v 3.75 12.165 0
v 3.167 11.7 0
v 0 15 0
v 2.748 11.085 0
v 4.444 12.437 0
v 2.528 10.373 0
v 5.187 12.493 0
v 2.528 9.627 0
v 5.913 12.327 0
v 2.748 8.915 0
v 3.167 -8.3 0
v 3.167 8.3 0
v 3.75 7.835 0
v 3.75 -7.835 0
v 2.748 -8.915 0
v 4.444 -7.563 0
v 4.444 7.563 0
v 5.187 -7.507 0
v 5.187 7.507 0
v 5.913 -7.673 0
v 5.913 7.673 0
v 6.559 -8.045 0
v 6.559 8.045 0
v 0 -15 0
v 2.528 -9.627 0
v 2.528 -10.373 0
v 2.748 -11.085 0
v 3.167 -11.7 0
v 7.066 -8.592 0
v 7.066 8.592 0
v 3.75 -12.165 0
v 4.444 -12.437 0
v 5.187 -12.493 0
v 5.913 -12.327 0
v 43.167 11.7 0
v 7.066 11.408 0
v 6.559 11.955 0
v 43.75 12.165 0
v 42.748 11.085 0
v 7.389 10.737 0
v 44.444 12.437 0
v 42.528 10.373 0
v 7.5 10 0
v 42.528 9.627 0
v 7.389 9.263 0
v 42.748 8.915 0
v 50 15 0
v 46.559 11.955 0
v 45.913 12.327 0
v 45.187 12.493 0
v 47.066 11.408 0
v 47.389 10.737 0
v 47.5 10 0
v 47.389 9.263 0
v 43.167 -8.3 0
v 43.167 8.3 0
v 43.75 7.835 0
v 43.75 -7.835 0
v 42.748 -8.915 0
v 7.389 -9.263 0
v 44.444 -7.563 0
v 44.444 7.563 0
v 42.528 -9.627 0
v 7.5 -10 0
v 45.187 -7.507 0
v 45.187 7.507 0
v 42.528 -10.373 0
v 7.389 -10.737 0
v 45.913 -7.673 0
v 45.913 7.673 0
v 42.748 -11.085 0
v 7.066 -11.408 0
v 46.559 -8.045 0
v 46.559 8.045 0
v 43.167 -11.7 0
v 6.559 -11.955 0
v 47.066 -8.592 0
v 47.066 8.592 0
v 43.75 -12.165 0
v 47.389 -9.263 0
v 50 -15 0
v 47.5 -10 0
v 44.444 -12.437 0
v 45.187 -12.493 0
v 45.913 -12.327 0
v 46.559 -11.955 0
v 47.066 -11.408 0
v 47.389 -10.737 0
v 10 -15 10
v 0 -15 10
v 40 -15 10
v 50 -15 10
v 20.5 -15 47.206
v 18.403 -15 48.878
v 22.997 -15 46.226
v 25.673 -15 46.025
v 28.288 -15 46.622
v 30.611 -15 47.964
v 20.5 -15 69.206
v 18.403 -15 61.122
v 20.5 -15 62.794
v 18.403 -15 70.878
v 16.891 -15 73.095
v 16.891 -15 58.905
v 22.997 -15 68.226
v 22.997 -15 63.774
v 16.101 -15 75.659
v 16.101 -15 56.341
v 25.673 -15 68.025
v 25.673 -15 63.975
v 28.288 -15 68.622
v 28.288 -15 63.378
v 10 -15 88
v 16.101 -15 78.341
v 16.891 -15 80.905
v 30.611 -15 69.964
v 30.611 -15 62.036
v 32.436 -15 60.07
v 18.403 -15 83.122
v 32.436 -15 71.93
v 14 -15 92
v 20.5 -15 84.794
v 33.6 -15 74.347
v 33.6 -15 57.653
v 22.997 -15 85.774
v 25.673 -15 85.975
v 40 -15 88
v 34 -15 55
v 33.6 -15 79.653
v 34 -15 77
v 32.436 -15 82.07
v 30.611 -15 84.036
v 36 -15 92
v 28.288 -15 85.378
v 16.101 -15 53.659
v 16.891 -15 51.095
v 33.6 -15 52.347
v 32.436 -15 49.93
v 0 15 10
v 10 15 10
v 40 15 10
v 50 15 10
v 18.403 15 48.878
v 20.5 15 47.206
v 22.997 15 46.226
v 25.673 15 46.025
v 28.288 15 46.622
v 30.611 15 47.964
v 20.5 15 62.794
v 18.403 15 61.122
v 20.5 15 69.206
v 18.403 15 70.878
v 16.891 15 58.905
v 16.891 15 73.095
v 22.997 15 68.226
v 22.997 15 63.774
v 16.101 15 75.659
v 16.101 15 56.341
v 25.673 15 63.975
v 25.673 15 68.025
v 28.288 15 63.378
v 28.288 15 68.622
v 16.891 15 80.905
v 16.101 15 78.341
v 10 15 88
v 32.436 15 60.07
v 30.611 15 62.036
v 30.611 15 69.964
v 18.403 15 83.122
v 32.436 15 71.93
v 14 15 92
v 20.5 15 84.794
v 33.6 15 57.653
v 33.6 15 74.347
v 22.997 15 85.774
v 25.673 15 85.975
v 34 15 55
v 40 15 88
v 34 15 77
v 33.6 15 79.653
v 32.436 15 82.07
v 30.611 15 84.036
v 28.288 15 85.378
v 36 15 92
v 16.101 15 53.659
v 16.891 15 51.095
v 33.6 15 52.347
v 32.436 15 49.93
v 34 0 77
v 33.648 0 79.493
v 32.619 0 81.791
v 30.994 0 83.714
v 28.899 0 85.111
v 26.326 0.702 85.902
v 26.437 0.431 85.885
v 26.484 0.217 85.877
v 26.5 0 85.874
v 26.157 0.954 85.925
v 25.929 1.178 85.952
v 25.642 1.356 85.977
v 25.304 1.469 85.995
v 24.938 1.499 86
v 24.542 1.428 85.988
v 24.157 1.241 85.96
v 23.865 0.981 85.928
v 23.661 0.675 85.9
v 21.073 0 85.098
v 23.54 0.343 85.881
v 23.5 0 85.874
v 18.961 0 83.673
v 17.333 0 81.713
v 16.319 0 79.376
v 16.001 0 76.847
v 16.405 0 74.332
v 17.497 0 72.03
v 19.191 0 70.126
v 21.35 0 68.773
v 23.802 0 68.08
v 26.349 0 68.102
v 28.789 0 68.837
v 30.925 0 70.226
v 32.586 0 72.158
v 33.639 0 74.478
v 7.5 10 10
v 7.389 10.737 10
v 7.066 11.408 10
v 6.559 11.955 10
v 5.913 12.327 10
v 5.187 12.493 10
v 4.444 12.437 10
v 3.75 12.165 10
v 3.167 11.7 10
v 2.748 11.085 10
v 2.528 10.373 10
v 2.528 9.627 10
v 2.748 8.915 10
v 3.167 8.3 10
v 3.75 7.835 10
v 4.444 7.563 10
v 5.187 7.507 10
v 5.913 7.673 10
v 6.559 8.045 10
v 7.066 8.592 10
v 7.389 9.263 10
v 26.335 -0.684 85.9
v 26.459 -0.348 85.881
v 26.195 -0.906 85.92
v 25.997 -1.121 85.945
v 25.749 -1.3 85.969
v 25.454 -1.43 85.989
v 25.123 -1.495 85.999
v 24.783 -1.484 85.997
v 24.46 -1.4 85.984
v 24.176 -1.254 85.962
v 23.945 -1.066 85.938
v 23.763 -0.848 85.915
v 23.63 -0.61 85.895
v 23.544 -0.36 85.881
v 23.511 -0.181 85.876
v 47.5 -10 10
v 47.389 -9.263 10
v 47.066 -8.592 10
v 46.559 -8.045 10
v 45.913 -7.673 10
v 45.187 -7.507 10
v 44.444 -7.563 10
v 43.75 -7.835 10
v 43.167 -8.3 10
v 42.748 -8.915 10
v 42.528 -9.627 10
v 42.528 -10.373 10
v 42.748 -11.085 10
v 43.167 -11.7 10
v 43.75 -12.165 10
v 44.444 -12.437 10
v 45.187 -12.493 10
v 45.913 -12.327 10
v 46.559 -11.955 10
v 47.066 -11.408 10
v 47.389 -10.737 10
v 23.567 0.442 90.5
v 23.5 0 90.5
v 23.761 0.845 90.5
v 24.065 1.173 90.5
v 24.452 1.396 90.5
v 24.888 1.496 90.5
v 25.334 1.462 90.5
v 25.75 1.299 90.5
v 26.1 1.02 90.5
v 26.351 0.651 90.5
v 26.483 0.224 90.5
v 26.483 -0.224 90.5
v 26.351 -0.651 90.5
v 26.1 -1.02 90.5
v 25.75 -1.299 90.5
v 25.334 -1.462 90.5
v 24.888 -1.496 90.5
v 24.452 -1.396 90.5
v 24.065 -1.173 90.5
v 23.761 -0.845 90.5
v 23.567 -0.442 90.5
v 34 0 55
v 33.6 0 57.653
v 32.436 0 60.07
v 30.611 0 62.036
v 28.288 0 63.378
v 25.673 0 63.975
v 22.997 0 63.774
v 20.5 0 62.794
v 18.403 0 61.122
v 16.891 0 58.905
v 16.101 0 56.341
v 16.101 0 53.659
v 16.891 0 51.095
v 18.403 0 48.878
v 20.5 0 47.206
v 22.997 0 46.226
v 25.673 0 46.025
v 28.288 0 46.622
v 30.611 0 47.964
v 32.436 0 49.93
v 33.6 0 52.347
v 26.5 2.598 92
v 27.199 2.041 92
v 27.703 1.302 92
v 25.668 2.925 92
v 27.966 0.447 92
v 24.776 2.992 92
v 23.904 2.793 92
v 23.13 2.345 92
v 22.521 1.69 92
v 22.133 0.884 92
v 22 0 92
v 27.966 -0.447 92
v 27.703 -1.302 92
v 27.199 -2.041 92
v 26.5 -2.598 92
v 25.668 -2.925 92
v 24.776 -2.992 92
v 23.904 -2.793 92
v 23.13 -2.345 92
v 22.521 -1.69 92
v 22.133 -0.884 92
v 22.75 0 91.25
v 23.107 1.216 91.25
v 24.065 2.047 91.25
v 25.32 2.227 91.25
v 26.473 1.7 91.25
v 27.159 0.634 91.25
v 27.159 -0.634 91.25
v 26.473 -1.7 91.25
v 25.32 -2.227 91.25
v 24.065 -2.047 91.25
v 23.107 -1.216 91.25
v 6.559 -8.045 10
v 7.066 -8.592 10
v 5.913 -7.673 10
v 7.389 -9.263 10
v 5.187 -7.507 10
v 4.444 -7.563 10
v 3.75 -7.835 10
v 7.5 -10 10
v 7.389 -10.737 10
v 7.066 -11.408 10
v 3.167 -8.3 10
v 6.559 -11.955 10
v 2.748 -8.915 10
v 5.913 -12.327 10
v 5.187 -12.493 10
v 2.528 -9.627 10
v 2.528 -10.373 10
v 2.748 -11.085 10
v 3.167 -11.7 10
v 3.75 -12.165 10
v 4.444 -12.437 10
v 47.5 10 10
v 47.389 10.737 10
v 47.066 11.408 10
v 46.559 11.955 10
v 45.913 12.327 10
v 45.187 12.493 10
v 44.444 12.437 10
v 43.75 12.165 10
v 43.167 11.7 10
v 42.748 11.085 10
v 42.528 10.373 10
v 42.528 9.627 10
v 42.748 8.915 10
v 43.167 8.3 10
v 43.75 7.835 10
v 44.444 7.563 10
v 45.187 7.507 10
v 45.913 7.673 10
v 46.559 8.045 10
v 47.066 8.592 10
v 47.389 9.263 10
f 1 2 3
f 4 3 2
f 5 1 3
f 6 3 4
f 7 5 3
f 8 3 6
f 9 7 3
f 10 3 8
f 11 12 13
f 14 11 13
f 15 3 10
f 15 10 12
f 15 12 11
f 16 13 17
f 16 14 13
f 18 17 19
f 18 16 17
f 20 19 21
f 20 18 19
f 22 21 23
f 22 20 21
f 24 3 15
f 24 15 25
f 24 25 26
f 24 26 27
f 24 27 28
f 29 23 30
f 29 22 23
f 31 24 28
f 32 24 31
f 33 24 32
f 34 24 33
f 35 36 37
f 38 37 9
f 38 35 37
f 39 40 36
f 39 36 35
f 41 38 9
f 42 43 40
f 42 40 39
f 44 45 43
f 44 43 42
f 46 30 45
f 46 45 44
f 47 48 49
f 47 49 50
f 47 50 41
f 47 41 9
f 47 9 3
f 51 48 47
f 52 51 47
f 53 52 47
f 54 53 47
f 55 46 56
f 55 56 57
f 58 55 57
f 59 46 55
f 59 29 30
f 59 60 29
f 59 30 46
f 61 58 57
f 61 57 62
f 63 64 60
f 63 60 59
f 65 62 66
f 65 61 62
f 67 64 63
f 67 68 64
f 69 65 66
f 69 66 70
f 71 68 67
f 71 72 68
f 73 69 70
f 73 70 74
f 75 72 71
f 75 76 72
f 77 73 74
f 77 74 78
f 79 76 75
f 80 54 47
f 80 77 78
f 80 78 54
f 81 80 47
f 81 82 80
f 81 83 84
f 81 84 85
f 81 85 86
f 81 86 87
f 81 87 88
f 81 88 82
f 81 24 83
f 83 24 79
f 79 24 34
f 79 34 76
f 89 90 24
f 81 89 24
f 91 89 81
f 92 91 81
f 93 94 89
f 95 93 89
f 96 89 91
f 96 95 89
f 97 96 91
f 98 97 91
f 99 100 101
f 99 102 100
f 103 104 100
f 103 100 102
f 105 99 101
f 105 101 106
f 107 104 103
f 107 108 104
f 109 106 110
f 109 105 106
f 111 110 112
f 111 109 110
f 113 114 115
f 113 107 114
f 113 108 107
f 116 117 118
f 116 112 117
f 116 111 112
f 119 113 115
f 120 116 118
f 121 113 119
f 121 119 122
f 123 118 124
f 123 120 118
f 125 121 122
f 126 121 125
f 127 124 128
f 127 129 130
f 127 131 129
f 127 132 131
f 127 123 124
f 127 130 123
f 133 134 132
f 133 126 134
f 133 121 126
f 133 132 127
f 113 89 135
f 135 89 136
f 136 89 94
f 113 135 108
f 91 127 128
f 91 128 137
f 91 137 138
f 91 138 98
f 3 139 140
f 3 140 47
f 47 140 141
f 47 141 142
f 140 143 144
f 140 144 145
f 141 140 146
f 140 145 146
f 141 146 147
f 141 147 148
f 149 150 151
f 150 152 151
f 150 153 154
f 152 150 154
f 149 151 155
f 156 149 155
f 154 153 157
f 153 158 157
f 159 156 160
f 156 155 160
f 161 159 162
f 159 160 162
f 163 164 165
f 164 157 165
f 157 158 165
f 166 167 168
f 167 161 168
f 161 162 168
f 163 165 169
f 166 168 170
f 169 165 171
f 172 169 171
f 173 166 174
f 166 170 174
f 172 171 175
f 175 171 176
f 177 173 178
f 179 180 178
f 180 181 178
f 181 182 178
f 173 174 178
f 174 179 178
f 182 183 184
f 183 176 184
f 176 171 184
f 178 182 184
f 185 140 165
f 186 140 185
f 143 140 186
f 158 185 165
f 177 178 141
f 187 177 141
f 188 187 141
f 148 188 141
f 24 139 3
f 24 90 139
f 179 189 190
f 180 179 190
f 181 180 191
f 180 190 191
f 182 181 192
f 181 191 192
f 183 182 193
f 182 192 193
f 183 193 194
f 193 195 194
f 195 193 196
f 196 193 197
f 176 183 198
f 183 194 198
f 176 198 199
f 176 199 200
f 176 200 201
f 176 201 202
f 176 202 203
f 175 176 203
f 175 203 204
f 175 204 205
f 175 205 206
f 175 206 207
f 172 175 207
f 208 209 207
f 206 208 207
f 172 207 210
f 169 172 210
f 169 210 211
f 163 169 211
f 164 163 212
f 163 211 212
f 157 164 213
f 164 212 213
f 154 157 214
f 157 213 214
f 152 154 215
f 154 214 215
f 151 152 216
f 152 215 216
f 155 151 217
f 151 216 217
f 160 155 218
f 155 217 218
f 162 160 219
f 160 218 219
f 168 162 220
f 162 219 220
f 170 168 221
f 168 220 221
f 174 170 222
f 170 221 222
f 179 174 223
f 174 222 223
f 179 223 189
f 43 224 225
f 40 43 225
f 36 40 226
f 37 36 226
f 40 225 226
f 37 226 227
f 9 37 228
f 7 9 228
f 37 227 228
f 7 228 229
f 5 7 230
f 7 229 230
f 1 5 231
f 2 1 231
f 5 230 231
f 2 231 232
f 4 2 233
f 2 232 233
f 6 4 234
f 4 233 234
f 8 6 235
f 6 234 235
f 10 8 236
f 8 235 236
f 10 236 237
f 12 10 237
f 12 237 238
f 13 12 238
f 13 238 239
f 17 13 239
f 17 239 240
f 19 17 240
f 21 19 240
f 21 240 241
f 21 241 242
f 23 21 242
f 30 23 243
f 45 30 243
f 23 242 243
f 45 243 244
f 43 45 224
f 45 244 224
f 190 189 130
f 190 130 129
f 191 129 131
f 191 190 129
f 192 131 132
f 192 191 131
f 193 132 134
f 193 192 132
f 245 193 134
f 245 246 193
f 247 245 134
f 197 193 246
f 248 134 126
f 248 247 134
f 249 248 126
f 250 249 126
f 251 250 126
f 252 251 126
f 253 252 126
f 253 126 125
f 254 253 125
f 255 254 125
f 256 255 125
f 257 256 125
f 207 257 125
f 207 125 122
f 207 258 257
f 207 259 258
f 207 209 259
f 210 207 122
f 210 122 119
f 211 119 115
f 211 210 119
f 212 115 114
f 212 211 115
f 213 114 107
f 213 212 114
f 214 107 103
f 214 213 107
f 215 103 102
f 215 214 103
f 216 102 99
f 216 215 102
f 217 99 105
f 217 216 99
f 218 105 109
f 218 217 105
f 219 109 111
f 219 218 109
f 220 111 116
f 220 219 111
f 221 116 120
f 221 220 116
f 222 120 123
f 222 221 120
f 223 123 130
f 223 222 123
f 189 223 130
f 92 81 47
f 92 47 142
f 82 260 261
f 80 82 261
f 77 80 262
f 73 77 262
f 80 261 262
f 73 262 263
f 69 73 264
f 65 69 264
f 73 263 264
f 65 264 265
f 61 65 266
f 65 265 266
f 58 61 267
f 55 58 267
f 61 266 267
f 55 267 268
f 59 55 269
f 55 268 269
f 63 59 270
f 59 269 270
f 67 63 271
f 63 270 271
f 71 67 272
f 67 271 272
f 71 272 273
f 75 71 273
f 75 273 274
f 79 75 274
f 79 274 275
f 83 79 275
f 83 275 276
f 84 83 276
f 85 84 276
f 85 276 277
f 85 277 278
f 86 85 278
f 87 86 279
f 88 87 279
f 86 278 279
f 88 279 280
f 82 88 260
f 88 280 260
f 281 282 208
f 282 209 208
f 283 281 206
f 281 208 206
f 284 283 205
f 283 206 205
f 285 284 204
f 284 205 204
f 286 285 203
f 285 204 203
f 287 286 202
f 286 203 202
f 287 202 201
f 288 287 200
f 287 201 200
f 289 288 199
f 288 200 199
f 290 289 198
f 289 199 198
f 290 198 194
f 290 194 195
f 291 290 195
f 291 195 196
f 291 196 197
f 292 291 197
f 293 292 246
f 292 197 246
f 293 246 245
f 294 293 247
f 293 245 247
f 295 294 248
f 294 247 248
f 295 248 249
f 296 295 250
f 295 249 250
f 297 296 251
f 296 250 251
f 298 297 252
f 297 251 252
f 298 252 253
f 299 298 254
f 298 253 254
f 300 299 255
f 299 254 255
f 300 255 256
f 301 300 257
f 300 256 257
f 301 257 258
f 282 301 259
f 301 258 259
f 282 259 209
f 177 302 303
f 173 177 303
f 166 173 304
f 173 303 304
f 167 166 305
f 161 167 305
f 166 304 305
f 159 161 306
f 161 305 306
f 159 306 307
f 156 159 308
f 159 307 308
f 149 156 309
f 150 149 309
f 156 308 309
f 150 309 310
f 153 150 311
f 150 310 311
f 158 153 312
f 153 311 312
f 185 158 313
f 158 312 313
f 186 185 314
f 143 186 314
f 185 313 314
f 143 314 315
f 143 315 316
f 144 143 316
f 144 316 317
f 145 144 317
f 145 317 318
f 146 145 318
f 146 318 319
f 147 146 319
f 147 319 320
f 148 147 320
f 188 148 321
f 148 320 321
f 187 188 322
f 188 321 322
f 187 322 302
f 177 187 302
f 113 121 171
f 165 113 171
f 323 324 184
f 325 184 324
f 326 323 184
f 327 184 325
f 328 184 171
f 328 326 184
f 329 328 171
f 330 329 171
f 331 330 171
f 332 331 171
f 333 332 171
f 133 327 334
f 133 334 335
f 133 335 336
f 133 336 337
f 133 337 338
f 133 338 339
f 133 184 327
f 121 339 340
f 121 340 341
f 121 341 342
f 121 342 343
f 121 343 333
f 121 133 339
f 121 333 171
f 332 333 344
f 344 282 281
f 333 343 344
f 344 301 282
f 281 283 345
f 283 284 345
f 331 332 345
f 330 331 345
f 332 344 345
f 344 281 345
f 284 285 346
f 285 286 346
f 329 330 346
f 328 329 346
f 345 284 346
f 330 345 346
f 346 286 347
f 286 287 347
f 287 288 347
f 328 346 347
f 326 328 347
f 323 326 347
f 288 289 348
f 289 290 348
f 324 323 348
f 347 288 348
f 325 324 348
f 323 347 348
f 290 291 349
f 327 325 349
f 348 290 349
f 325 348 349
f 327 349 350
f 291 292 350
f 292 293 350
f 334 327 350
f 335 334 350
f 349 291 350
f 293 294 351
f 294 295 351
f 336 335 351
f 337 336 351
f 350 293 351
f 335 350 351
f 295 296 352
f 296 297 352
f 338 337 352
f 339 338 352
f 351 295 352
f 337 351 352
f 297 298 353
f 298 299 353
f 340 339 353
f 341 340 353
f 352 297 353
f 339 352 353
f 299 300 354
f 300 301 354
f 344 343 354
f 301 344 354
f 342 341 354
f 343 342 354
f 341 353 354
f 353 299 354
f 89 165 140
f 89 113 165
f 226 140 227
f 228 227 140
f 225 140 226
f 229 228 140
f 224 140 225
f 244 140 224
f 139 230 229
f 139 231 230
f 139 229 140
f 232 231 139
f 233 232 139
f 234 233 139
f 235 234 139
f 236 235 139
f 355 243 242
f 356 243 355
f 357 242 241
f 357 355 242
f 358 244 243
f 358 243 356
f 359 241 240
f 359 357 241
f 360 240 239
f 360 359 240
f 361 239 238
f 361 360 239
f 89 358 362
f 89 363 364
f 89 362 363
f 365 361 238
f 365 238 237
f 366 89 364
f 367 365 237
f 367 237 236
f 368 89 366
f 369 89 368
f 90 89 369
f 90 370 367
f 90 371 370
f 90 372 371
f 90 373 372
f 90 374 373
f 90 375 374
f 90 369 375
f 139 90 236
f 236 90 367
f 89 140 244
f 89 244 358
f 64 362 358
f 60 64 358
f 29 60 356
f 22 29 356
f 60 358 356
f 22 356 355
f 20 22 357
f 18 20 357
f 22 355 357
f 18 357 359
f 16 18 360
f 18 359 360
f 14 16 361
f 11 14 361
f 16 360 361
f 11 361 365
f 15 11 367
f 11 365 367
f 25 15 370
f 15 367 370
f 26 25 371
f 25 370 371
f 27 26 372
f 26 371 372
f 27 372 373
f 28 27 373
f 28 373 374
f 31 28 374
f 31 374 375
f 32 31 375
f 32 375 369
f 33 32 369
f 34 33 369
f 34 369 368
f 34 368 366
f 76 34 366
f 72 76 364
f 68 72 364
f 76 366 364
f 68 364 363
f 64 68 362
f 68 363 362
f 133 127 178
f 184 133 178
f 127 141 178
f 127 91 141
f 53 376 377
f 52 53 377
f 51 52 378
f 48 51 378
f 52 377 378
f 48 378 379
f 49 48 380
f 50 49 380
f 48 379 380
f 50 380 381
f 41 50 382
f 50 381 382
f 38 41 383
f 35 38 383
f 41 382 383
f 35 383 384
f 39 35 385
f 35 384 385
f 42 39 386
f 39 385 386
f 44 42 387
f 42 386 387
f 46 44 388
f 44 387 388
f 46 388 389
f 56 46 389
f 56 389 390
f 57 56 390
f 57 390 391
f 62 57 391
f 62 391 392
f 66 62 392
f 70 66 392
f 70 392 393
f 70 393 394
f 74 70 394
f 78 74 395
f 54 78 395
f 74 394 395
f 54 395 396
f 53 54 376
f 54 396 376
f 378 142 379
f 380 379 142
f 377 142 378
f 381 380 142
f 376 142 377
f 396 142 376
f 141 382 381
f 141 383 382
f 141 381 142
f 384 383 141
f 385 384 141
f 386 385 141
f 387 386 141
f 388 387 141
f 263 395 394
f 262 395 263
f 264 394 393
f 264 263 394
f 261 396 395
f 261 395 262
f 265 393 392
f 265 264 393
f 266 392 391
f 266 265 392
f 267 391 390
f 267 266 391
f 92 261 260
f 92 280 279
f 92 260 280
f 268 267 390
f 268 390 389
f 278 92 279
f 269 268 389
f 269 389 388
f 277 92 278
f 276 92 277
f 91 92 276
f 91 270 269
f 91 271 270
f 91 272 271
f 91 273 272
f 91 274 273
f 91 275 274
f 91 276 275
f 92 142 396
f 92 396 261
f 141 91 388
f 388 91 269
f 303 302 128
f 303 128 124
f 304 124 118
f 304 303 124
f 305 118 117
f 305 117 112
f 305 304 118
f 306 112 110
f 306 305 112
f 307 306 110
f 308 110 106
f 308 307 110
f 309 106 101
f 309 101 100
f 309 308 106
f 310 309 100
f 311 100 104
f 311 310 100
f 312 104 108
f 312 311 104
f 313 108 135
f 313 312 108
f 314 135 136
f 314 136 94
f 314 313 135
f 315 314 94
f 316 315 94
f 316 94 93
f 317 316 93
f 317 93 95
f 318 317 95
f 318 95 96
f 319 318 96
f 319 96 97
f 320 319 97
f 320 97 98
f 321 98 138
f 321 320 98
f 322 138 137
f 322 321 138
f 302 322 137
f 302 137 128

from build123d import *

# Parameters (mm, degrees)
F0_R           = 9
F1_DEPTH       = 15
F1_DEPTH_BACK  = 15
F2_SIZE        = 4
F4_D           = 3
F4_DEPTH       = 10
F4_CSINK_D     = 6
F4_CSINK_ANGLE = 90
F5_R           = 2.5
F6_DEPTH       = 10


with BuildPart() as f1:
    # F0 (on Front) → F1 (new body, two sides)
    with BuildSketch(Plane.XZ) as f1_sk:
        Polygon((0, 10), (0, 0), (50, 0), (50, 10), (40, 10), (40, 92), (10, 92), (10, 10), align=None)
        with Locations((25, 55)):
            Circle(F0_R, mode=Mode.SUBTRACT)
        with Locations((25, 77)):
            Circle(F0_R, mode=Mode.SUBTRACT)
    extrude(amount=F1_DEPTH)
    extrude(f1_sk.sketch, amount=-F1_DEPTH_BACK)

    # F2
    f2_edges = [f1.edges().sort_by_distance(p)[0] for p in [
        (40, 0, 92),
        (10, 0, 92),
    ]]
    chamfer(f2_edges, length=F2_SIZE)

    # F4
    with Locations(Plane.XY.offset(92)):
        with Locations((25, 0)):
            CounterSinkHole(F4_D / 2, F4_CSINK_D / 2, depth=F4_DEPTH, counter_sink_angle=F4_CSINK_ANGLE)

    # F5 (on face) → F6 (cut)
    with BuildSketch(Plane.XY.offset(10)):
        with Locations((5, 10)):
            Circle(F5_R)
        with Locations((5, -10)):
            Circle(F5_R)
        with Locations((45, -10)):
            Circle(F5_R)
        with Locations((45, 10)):
            Circle(F5_R)
    extrude(amount=-F6_DEPTH, mode=Mode.SUBTRACT)


solid = f1.part
